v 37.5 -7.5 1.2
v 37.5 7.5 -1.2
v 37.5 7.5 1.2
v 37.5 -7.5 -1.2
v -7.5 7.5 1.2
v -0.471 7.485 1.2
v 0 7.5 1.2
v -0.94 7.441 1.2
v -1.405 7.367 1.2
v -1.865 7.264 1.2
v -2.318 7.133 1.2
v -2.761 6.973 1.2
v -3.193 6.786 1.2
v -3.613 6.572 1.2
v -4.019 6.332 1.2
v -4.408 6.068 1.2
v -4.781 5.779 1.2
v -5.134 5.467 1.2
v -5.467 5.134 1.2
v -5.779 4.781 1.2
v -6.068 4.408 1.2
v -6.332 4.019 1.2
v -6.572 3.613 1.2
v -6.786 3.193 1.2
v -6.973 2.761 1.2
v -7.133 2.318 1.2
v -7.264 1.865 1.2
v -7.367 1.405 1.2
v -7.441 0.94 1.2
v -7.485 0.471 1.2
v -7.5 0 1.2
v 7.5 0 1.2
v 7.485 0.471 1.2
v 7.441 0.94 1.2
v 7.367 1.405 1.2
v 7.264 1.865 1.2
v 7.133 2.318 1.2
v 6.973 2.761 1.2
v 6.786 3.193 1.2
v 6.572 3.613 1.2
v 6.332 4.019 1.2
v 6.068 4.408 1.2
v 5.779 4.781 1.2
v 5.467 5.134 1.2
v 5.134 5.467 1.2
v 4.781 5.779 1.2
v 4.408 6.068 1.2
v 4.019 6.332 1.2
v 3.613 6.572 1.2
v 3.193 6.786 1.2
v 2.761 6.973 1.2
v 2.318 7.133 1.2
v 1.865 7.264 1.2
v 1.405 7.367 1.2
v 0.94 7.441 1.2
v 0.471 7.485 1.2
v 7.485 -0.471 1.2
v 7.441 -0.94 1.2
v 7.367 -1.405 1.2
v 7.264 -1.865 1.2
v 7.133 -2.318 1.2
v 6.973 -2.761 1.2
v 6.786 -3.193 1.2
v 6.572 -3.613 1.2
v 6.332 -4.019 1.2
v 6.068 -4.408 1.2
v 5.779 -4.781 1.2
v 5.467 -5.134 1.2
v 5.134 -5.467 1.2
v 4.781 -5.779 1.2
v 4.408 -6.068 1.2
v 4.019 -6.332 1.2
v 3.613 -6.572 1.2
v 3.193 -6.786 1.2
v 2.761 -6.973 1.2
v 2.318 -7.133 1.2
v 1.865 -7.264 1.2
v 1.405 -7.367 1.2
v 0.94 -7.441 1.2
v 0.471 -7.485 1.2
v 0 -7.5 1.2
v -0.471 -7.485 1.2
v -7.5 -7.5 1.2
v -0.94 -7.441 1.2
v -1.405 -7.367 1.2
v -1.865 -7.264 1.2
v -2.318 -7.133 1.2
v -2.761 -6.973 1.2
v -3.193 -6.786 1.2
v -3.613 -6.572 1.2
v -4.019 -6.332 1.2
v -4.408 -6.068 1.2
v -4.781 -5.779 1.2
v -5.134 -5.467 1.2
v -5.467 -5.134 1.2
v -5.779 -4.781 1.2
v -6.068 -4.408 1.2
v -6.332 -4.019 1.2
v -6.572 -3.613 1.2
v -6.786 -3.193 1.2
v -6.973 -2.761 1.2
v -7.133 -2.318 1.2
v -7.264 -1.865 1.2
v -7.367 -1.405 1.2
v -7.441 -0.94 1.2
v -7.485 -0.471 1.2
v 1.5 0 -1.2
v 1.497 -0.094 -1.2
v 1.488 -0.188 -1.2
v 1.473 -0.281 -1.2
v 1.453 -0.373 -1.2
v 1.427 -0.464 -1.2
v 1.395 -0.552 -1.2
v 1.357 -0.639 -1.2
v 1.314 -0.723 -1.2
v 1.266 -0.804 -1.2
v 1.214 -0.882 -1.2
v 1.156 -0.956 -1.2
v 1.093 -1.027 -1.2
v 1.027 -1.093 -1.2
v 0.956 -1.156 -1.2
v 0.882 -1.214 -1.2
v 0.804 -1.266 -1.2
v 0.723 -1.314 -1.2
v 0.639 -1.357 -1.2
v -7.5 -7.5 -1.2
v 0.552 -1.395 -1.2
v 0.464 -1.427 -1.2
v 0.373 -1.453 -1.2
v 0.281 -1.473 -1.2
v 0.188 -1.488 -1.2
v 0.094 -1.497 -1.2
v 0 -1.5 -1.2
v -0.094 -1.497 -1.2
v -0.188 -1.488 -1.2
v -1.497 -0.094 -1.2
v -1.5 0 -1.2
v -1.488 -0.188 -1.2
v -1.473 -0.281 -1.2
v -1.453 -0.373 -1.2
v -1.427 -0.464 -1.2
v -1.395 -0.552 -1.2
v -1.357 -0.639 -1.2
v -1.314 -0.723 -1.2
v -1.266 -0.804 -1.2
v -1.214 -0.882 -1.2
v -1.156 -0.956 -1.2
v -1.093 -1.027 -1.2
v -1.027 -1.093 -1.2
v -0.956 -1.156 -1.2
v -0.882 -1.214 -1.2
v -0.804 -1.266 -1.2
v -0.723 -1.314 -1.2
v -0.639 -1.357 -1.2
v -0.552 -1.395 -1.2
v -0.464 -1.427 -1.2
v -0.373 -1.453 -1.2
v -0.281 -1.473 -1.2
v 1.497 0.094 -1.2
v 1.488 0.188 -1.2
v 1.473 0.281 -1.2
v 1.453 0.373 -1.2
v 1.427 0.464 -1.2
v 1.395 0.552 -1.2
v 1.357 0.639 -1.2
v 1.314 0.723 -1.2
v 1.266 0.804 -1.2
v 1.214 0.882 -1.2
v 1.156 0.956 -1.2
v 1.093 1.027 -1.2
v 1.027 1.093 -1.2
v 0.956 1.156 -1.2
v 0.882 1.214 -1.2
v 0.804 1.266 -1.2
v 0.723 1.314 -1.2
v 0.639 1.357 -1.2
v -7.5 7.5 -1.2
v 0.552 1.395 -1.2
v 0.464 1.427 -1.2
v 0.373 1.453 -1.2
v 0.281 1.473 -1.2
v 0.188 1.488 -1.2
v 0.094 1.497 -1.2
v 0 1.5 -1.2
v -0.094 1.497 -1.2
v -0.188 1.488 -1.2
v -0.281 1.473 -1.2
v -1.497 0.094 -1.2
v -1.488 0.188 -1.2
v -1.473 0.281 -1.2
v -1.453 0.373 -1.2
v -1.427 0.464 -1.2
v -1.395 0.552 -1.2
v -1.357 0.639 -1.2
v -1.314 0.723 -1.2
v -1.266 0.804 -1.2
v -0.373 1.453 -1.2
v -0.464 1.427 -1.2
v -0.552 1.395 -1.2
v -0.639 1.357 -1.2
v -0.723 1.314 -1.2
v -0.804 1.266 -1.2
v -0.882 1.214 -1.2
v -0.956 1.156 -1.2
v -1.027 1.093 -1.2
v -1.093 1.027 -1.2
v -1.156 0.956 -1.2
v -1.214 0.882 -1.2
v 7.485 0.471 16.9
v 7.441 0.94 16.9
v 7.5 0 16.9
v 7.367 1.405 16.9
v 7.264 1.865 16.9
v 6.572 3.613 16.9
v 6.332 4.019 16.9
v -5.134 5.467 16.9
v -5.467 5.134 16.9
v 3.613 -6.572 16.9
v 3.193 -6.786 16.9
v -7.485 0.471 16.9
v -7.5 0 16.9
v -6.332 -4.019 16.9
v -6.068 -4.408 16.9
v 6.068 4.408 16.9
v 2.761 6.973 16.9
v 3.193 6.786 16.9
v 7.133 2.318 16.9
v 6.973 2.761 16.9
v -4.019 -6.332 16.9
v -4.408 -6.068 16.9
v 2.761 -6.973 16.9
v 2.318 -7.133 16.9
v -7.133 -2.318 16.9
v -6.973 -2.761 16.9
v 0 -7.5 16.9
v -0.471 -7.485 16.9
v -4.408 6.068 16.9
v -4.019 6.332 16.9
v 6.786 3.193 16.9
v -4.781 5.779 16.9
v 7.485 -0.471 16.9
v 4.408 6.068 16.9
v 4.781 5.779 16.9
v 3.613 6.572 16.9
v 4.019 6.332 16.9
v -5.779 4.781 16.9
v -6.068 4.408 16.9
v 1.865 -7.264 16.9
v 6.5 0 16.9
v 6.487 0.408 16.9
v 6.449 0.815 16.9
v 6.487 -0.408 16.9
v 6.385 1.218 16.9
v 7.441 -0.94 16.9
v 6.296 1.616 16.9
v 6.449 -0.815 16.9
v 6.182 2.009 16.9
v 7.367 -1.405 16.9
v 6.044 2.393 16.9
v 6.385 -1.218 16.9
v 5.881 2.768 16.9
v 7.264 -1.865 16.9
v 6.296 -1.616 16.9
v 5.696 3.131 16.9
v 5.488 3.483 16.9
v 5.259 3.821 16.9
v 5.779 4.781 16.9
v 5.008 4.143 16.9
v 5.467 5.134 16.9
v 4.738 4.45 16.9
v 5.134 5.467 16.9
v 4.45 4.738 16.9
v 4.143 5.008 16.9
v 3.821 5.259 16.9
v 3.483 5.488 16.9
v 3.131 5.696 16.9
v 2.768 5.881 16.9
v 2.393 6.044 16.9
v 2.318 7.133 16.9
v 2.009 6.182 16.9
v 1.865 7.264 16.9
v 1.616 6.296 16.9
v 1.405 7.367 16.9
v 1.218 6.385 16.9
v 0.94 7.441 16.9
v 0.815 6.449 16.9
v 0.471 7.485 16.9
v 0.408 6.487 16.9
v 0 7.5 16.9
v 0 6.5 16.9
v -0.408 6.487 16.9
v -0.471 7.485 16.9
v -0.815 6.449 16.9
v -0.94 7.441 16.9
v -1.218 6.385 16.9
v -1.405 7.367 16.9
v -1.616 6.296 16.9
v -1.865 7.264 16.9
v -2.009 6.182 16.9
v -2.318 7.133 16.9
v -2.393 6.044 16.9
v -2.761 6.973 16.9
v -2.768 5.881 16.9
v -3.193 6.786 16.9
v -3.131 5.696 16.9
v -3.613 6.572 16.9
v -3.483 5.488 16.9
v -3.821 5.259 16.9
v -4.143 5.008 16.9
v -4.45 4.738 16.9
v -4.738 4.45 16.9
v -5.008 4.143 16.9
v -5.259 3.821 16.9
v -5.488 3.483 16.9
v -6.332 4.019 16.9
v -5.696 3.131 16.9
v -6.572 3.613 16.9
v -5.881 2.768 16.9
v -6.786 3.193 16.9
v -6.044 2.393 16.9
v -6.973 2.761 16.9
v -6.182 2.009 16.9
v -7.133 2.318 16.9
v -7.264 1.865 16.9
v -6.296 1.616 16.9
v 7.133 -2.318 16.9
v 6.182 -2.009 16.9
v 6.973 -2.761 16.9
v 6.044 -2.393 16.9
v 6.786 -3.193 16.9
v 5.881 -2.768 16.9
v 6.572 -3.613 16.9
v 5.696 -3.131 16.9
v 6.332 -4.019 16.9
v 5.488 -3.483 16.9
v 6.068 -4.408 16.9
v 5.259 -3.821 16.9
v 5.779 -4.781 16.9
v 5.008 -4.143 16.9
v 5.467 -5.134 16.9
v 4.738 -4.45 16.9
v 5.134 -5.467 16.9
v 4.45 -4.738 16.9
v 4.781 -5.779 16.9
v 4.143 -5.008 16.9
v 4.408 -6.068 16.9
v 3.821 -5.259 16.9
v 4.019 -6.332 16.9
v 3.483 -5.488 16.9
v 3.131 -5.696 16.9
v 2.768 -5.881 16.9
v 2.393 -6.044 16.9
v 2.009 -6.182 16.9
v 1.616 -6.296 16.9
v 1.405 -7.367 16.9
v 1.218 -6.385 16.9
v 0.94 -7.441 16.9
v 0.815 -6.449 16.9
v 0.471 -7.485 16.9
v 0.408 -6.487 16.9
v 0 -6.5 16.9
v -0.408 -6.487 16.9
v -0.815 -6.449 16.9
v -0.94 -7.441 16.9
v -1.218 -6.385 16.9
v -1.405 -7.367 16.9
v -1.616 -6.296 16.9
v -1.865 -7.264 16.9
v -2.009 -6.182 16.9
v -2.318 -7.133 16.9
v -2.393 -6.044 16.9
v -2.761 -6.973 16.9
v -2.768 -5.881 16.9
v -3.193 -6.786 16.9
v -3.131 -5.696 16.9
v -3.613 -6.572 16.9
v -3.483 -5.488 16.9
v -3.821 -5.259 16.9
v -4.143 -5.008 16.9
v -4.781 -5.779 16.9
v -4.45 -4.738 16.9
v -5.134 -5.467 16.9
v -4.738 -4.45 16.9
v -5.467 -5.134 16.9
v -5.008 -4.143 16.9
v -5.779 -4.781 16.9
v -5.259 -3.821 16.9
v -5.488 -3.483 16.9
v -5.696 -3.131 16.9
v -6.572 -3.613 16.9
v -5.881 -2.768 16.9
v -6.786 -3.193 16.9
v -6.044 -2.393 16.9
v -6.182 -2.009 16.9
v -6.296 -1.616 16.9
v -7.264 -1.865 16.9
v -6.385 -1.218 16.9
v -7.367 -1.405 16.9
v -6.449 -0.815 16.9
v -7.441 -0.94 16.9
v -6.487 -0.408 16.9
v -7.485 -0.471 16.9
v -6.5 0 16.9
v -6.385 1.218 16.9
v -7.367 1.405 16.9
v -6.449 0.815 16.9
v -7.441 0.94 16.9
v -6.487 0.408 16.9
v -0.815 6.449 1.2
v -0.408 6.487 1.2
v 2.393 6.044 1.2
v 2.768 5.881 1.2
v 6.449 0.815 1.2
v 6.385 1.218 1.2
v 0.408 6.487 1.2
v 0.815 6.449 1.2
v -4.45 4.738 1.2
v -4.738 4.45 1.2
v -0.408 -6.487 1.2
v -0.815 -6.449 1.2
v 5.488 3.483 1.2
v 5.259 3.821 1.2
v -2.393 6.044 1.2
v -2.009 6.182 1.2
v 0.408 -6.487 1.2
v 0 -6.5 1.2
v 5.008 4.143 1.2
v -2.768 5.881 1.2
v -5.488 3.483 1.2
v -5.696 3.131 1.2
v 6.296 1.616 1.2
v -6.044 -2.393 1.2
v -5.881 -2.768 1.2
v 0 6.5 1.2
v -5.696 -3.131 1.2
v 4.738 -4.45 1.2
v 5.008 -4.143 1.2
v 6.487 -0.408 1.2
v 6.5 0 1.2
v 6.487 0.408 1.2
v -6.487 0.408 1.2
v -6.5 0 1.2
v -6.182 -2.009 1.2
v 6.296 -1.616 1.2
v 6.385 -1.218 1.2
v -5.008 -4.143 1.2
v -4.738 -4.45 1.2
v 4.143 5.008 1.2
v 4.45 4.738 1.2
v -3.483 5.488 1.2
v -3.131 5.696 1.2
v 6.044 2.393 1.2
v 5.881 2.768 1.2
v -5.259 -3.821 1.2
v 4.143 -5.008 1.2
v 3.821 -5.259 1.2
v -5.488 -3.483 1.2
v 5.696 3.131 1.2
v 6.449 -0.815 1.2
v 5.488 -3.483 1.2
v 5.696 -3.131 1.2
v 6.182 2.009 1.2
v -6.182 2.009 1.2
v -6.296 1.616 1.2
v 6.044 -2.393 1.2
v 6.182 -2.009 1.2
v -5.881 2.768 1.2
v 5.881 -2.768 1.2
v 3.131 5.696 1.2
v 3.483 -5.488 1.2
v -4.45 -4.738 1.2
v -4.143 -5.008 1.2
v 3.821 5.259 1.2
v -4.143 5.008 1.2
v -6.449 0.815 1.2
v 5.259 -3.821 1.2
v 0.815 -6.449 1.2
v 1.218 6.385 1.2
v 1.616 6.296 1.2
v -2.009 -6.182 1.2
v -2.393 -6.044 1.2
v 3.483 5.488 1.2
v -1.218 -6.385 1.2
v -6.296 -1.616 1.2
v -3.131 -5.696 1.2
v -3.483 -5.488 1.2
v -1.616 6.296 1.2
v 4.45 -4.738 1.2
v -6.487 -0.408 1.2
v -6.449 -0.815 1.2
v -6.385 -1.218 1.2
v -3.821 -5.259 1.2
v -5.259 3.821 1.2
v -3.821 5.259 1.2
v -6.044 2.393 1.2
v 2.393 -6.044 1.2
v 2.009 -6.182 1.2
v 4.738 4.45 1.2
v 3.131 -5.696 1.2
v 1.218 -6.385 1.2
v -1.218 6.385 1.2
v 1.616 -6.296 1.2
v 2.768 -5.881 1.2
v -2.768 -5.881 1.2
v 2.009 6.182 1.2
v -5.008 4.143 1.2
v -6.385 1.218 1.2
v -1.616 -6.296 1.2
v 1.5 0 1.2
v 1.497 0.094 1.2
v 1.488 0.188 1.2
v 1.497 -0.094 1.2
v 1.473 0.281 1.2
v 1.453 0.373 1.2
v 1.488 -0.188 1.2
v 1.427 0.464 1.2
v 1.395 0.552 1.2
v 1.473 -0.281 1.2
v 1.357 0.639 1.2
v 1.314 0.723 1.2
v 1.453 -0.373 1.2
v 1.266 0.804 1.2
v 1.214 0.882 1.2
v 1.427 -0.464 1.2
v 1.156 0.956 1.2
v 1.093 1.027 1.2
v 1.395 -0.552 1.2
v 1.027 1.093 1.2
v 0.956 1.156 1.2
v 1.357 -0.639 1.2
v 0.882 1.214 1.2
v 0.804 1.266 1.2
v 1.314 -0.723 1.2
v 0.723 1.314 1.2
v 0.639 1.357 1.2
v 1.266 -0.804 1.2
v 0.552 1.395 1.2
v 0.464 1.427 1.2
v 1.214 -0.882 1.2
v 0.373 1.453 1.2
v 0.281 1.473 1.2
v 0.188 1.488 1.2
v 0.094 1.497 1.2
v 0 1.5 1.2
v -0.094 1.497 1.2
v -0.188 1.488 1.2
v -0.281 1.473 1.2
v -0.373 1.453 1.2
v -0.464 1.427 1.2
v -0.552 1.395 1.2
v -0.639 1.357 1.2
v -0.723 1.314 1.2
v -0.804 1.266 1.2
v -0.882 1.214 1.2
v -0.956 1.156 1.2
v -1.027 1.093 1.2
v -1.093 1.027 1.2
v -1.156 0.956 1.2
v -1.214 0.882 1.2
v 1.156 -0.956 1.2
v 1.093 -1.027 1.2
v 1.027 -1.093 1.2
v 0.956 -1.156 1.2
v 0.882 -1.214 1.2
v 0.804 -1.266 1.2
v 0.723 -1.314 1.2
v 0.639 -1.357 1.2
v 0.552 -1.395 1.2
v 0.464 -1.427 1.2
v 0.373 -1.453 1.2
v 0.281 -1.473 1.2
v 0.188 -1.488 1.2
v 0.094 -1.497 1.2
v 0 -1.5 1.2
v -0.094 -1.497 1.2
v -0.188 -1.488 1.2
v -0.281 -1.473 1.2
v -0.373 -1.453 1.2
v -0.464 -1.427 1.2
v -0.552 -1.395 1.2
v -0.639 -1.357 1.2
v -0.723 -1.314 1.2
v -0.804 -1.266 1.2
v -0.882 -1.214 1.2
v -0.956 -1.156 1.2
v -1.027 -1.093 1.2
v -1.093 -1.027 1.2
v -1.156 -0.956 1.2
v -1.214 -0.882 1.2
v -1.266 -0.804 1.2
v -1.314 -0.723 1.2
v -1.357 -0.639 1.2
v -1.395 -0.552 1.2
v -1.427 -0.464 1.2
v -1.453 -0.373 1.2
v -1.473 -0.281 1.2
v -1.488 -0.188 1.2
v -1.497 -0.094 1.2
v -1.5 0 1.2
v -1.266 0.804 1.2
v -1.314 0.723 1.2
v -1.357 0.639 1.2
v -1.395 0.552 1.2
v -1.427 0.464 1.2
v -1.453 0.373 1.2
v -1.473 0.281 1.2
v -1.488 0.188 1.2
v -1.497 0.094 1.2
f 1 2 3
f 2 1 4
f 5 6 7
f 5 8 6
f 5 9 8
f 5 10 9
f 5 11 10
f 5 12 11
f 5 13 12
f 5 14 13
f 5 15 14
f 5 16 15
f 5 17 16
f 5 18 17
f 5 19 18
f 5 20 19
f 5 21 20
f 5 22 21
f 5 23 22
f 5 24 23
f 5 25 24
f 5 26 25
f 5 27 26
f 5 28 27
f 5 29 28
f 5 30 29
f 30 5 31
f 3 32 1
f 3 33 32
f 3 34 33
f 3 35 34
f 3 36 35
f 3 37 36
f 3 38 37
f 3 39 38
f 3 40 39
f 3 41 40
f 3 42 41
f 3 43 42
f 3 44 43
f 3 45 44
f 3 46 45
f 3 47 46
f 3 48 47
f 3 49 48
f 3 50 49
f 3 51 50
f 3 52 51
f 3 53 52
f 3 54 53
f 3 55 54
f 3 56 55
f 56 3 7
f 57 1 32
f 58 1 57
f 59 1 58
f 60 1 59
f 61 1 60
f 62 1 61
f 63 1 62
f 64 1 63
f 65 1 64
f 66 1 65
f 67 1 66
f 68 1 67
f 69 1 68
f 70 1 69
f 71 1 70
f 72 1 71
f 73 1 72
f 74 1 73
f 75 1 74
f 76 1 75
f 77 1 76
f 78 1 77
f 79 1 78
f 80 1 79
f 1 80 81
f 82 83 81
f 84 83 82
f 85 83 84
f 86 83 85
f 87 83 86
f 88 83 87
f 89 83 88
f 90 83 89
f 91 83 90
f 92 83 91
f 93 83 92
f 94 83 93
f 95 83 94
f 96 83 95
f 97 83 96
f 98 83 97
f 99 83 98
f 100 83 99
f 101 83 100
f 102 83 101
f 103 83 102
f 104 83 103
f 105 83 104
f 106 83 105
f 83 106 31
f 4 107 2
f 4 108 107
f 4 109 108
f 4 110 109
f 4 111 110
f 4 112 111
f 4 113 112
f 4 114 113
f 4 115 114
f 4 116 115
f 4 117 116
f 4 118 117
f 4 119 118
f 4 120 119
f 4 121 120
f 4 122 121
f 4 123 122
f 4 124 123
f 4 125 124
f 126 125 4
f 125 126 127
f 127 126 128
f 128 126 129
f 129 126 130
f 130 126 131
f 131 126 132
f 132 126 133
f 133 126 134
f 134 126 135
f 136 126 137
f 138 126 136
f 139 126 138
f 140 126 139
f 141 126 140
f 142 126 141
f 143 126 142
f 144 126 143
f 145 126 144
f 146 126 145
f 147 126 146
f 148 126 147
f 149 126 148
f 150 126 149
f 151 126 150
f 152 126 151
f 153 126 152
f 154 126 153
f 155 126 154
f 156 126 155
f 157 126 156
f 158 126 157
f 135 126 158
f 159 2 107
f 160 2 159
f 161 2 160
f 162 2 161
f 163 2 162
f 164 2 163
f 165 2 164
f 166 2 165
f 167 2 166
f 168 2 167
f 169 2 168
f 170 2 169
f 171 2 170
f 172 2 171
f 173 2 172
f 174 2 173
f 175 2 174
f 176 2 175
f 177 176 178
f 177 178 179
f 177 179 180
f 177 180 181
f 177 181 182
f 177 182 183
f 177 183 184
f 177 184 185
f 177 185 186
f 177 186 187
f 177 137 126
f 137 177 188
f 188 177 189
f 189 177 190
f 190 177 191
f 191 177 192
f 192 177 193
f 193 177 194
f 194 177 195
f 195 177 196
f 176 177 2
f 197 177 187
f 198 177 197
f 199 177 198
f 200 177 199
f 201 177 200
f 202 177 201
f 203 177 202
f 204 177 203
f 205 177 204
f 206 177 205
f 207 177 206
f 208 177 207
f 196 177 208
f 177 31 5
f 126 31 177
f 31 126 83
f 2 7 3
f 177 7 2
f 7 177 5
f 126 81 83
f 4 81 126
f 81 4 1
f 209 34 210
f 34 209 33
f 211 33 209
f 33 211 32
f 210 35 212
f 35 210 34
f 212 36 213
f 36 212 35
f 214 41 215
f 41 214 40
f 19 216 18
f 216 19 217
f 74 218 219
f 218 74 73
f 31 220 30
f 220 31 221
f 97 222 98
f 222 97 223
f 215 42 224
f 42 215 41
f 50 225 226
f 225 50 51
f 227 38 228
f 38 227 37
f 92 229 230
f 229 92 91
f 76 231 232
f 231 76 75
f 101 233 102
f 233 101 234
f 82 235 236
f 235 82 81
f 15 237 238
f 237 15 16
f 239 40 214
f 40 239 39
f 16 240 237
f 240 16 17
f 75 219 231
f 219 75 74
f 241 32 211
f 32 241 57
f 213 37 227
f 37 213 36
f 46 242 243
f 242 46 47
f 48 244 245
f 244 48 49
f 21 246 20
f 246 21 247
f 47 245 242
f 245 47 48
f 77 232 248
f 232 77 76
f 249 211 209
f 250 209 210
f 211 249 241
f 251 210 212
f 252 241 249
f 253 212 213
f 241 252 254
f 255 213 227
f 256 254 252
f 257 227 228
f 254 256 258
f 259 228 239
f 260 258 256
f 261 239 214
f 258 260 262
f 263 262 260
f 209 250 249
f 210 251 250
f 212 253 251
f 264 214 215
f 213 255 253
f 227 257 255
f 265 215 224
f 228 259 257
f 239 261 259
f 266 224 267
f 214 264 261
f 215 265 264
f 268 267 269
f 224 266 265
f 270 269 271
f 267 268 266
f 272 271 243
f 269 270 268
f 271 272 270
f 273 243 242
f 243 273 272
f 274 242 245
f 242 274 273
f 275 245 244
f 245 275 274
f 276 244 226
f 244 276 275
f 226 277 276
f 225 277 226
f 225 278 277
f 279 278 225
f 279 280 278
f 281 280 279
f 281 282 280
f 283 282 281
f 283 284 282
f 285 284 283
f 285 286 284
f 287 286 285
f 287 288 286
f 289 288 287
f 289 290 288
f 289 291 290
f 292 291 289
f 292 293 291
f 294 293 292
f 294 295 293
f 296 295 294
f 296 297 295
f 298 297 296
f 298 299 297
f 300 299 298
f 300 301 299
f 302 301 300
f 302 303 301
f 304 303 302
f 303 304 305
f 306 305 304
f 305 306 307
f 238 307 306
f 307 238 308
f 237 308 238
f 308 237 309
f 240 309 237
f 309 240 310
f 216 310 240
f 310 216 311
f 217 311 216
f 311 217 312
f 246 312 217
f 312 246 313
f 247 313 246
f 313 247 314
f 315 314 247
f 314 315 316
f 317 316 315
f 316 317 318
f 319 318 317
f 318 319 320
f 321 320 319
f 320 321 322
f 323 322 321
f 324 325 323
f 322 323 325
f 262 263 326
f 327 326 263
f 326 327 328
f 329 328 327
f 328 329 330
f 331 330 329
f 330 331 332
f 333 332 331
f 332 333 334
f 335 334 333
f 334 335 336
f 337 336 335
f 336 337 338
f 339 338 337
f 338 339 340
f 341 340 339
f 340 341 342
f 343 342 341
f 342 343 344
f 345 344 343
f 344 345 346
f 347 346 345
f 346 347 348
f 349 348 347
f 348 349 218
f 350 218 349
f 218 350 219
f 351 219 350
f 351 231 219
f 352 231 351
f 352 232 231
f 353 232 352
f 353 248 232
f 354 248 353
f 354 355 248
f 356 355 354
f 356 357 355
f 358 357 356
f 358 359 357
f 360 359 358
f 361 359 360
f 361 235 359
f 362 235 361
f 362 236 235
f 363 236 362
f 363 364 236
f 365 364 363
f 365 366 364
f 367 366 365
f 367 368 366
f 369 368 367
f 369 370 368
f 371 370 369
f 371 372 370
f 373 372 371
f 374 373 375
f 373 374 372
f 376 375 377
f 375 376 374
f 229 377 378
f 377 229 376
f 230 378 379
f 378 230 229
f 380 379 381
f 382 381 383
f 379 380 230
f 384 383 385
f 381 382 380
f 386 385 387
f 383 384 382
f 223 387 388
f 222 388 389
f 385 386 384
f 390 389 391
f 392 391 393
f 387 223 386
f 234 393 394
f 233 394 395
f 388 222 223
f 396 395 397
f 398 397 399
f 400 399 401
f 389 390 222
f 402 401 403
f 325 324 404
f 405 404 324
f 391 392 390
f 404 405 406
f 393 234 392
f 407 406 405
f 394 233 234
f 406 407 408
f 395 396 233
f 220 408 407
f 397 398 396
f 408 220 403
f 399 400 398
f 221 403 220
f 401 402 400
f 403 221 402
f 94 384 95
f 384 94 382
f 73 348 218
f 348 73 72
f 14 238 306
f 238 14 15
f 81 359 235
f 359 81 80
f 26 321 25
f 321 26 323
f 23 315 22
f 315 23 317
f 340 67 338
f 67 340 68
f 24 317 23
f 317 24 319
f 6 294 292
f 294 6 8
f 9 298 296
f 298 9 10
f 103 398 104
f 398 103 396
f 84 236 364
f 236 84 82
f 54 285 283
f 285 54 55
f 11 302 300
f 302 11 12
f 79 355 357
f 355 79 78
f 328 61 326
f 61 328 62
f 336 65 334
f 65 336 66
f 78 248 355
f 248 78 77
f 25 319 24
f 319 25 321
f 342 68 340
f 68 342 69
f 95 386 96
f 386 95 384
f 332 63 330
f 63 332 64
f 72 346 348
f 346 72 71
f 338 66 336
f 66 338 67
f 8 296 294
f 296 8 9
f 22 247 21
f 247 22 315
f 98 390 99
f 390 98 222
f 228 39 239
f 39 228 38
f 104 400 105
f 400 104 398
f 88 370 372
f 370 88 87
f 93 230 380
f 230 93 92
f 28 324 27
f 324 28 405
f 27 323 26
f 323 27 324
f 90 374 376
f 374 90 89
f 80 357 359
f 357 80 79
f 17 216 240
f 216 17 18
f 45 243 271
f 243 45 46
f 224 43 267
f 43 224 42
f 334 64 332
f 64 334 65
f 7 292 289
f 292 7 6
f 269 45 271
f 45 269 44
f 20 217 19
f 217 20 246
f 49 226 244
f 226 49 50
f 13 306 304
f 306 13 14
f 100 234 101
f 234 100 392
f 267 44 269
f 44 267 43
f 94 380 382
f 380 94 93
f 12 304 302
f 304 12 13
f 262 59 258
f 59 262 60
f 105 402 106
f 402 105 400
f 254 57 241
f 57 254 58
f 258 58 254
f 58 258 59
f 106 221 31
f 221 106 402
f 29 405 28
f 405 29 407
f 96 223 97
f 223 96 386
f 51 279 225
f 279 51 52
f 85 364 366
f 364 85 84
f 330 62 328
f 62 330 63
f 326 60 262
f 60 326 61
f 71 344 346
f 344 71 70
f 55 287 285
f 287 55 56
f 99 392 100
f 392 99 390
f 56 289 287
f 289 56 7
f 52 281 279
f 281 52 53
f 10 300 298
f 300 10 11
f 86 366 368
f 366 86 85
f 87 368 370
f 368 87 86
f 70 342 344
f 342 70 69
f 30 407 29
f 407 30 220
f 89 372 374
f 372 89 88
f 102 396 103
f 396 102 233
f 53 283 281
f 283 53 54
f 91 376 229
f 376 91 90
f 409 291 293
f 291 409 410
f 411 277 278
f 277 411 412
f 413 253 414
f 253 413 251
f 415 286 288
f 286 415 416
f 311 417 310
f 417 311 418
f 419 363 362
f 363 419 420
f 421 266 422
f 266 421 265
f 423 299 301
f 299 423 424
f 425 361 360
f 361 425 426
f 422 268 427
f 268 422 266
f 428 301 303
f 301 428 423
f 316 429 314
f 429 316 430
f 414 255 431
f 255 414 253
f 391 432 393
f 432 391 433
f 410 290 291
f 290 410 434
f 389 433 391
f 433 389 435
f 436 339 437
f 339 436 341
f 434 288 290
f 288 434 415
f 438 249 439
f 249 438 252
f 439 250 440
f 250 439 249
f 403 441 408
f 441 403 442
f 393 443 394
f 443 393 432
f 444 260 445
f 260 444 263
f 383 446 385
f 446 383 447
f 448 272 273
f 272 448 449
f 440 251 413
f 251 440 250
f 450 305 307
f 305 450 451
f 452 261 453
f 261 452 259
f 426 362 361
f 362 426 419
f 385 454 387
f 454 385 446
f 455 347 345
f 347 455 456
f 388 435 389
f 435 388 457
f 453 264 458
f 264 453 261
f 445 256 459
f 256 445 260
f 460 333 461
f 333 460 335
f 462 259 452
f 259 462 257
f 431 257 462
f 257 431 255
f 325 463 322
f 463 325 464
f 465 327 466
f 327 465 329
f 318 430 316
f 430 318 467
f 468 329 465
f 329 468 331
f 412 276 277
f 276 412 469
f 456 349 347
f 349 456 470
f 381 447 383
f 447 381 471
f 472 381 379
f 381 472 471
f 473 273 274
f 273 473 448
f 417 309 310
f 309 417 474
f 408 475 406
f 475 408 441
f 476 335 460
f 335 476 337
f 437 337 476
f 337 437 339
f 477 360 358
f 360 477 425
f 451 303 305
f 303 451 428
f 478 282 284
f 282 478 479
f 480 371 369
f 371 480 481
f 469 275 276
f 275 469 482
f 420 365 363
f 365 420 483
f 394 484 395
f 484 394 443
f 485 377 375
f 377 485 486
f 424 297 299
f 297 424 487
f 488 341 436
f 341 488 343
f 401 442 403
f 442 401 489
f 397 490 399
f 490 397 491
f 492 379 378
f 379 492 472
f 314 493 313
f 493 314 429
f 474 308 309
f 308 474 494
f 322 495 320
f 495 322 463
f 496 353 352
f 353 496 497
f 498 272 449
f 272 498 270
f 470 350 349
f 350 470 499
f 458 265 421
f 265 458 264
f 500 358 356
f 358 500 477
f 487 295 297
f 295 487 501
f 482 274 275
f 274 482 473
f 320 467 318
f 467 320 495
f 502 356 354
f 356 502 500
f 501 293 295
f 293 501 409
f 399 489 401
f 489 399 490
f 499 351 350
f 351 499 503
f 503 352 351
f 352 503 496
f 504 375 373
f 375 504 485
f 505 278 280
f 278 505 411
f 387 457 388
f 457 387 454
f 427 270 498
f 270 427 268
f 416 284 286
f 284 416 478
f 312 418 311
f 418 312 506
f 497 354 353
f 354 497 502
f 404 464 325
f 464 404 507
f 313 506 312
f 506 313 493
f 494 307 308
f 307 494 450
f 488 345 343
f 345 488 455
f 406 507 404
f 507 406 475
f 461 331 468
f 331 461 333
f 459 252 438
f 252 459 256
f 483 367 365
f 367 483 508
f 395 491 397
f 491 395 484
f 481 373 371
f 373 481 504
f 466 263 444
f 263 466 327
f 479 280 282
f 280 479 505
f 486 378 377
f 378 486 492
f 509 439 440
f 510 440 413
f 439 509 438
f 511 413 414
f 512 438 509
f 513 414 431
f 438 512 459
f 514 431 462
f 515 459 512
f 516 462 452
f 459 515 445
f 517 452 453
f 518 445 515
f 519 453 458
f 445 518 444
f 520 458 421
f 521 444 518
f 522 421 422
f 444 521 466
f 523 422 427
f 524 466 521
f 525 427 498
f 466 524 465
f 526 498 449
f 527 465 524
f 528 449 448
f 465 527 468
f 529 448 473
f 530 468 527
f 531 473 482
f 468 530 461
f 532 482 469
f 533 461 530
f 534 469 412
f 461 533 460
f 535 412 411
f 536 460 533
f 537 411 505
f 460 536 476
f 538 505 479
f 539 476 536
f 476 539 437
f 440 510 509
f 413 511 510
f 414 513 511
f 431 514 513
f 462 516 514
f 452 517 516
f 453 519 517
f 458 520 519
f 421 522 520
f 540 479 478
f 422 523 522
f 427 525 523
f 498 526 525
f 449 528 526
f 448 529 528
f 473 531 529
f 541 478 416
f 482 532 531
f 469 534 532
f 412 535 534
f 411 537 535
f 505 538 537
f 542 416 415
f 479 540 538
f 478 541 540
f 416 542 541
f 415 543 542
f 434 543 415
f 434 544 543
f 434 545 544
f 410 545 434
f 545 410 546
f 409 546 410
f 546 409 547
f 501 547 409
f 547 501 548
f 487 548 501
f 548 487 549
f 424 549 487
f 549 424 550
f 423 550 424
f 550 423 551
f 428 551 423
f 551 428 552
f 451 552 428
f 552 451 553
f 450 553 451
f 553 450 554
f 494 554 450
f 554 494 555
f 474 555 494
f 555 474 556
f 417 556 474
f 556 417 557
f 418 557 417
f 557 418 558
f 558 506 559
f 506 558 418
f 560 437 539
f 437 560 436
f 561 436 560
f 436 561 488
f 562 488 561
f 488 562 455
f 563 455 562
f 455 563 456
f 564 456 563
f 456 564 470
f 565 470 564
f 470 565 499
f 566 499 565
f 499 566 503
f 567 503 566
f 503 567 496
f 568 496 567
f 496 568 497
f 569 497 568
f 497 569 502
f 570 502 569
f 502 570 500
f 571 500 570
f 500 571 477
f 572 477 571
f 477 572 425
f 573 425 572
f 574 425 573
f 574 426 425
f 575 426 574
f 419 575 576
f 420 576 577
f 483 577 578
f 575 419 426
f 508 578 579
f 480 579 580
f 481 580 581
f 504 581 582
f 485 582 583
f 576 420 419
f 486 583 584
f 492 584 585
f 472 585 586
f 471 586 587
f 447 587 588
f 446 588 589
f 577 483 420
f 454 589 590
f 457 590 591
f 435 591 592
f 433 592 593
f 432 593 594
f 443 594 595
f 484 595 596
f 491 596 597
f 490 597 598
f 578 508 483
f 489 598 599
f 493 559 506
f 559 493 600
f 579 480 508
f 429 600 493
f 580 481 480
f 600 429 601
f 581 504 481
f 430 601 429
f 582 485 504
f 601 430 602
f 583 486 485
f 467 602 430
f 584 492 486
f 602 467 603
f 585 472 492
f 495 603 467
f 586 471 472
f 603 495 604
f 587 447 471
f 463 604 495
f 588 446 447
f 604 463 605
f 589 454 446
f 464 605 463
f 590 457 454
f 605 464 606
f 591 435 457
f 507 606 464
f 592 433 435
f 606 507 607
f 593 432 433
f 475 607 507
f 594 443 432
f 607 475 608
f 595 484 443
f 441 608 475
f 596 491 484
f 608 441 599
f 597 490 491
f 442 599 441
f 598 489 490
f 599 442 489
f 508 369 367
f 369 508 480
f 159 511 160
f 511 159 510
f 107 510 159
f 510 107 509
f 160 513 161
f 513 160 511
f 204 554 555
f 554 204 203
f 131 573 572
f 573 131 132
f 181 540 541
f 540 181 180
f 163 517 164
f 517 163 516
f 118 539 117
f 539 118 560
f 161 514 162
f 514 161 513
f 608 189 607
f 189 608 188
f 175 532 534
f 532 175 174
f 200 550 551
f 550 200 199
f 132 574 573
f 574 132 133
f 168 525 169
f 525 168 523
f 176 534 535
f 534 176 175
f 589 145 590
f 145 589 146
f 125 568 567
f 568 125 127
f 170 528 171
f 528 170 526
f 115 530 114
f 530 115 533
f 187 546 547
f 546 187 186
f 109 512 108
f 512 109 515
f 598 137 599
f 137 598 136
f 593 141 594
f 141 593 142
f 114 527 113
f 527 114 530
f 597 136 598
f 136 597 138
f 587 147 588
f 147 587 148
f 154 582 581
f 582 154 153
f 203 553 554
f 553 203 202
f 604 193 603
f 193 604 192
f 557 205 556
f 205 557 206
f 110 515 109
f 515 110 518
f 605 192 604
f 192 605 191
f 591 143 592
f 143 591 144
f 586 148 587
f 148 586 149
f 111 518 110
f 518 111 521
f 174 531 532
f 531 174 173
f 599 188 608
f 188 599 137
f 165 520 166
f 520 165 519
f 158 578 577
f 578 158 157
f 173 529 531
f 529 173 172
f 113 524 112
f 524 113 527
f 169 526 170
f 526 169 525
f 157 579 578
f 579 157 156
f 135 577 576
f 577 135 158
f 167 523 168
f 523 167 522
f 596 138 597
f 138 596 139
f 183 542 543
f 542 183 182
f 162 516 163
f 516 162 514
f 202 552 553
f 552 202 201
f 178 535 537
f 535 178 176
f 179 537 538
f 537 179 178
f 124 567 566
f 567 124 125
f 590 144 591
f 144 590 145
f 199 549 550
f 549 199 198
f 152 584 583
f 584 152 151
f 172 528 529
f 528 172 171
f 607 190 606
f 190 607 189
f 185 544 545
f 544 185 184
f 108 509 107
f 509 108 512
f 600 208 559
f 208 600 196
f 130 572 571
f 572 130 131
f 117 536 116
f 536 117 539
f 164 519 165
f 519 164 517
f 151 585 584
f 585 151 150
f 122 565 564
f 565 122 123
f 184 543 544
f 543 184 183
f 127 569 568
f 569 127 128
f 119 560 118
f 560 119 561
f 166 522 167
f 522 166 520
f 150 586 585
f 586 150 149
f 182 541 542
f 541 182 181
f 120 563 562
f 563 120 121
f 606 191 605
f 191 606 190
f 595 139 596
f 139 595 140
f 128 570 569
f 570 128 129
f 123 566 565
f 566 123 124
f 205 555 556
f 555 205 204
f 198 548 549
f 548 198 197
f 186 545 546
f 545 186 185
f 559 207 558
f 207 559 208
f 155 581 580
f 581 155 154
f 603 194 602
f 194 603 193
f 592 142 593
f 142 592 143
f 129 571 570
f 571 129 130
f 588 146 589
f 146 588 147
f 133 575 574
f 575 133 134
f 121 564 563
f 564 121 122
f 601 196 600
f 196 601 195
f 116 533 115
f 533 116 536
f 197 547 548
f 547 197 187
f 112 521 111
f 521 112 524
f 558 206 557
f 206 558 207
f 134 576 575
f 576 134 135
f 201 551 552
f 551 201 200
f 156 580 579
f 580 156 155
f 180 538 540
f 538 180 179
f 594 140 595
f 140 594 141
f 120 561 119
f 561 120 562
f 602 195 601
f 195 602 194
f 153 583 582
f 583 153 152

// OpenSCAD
// Pinholes used for the hyperspectral scanner

y = 15;
r1 = y/2;
x = 37.5+r1;

z = 2.4;

h1 = 20.5-z*2;
r2 = (y/2-1);
r3 = 3/2; // The size of the pinhole, radius in mm

module plus () {
    translate ([x/2-r1,0,0]) {cube (([x, y, z]), center = true);}
    
    translate ([0,0,h1/2+z/2]) {cylinder (h1, r1, r1, $fn = 100, center = true);}

}

module minus (){
    translate ([0,0,h1/2+z/2]) {cylinder (h1, r2, r2, $fn = 100, center = true);}
    
    translate ([0,0,0]) {cylinder (z, r3, r3, $fn = 100, center = true); }
   
}

{difference(){ plus(); minus ();}}
